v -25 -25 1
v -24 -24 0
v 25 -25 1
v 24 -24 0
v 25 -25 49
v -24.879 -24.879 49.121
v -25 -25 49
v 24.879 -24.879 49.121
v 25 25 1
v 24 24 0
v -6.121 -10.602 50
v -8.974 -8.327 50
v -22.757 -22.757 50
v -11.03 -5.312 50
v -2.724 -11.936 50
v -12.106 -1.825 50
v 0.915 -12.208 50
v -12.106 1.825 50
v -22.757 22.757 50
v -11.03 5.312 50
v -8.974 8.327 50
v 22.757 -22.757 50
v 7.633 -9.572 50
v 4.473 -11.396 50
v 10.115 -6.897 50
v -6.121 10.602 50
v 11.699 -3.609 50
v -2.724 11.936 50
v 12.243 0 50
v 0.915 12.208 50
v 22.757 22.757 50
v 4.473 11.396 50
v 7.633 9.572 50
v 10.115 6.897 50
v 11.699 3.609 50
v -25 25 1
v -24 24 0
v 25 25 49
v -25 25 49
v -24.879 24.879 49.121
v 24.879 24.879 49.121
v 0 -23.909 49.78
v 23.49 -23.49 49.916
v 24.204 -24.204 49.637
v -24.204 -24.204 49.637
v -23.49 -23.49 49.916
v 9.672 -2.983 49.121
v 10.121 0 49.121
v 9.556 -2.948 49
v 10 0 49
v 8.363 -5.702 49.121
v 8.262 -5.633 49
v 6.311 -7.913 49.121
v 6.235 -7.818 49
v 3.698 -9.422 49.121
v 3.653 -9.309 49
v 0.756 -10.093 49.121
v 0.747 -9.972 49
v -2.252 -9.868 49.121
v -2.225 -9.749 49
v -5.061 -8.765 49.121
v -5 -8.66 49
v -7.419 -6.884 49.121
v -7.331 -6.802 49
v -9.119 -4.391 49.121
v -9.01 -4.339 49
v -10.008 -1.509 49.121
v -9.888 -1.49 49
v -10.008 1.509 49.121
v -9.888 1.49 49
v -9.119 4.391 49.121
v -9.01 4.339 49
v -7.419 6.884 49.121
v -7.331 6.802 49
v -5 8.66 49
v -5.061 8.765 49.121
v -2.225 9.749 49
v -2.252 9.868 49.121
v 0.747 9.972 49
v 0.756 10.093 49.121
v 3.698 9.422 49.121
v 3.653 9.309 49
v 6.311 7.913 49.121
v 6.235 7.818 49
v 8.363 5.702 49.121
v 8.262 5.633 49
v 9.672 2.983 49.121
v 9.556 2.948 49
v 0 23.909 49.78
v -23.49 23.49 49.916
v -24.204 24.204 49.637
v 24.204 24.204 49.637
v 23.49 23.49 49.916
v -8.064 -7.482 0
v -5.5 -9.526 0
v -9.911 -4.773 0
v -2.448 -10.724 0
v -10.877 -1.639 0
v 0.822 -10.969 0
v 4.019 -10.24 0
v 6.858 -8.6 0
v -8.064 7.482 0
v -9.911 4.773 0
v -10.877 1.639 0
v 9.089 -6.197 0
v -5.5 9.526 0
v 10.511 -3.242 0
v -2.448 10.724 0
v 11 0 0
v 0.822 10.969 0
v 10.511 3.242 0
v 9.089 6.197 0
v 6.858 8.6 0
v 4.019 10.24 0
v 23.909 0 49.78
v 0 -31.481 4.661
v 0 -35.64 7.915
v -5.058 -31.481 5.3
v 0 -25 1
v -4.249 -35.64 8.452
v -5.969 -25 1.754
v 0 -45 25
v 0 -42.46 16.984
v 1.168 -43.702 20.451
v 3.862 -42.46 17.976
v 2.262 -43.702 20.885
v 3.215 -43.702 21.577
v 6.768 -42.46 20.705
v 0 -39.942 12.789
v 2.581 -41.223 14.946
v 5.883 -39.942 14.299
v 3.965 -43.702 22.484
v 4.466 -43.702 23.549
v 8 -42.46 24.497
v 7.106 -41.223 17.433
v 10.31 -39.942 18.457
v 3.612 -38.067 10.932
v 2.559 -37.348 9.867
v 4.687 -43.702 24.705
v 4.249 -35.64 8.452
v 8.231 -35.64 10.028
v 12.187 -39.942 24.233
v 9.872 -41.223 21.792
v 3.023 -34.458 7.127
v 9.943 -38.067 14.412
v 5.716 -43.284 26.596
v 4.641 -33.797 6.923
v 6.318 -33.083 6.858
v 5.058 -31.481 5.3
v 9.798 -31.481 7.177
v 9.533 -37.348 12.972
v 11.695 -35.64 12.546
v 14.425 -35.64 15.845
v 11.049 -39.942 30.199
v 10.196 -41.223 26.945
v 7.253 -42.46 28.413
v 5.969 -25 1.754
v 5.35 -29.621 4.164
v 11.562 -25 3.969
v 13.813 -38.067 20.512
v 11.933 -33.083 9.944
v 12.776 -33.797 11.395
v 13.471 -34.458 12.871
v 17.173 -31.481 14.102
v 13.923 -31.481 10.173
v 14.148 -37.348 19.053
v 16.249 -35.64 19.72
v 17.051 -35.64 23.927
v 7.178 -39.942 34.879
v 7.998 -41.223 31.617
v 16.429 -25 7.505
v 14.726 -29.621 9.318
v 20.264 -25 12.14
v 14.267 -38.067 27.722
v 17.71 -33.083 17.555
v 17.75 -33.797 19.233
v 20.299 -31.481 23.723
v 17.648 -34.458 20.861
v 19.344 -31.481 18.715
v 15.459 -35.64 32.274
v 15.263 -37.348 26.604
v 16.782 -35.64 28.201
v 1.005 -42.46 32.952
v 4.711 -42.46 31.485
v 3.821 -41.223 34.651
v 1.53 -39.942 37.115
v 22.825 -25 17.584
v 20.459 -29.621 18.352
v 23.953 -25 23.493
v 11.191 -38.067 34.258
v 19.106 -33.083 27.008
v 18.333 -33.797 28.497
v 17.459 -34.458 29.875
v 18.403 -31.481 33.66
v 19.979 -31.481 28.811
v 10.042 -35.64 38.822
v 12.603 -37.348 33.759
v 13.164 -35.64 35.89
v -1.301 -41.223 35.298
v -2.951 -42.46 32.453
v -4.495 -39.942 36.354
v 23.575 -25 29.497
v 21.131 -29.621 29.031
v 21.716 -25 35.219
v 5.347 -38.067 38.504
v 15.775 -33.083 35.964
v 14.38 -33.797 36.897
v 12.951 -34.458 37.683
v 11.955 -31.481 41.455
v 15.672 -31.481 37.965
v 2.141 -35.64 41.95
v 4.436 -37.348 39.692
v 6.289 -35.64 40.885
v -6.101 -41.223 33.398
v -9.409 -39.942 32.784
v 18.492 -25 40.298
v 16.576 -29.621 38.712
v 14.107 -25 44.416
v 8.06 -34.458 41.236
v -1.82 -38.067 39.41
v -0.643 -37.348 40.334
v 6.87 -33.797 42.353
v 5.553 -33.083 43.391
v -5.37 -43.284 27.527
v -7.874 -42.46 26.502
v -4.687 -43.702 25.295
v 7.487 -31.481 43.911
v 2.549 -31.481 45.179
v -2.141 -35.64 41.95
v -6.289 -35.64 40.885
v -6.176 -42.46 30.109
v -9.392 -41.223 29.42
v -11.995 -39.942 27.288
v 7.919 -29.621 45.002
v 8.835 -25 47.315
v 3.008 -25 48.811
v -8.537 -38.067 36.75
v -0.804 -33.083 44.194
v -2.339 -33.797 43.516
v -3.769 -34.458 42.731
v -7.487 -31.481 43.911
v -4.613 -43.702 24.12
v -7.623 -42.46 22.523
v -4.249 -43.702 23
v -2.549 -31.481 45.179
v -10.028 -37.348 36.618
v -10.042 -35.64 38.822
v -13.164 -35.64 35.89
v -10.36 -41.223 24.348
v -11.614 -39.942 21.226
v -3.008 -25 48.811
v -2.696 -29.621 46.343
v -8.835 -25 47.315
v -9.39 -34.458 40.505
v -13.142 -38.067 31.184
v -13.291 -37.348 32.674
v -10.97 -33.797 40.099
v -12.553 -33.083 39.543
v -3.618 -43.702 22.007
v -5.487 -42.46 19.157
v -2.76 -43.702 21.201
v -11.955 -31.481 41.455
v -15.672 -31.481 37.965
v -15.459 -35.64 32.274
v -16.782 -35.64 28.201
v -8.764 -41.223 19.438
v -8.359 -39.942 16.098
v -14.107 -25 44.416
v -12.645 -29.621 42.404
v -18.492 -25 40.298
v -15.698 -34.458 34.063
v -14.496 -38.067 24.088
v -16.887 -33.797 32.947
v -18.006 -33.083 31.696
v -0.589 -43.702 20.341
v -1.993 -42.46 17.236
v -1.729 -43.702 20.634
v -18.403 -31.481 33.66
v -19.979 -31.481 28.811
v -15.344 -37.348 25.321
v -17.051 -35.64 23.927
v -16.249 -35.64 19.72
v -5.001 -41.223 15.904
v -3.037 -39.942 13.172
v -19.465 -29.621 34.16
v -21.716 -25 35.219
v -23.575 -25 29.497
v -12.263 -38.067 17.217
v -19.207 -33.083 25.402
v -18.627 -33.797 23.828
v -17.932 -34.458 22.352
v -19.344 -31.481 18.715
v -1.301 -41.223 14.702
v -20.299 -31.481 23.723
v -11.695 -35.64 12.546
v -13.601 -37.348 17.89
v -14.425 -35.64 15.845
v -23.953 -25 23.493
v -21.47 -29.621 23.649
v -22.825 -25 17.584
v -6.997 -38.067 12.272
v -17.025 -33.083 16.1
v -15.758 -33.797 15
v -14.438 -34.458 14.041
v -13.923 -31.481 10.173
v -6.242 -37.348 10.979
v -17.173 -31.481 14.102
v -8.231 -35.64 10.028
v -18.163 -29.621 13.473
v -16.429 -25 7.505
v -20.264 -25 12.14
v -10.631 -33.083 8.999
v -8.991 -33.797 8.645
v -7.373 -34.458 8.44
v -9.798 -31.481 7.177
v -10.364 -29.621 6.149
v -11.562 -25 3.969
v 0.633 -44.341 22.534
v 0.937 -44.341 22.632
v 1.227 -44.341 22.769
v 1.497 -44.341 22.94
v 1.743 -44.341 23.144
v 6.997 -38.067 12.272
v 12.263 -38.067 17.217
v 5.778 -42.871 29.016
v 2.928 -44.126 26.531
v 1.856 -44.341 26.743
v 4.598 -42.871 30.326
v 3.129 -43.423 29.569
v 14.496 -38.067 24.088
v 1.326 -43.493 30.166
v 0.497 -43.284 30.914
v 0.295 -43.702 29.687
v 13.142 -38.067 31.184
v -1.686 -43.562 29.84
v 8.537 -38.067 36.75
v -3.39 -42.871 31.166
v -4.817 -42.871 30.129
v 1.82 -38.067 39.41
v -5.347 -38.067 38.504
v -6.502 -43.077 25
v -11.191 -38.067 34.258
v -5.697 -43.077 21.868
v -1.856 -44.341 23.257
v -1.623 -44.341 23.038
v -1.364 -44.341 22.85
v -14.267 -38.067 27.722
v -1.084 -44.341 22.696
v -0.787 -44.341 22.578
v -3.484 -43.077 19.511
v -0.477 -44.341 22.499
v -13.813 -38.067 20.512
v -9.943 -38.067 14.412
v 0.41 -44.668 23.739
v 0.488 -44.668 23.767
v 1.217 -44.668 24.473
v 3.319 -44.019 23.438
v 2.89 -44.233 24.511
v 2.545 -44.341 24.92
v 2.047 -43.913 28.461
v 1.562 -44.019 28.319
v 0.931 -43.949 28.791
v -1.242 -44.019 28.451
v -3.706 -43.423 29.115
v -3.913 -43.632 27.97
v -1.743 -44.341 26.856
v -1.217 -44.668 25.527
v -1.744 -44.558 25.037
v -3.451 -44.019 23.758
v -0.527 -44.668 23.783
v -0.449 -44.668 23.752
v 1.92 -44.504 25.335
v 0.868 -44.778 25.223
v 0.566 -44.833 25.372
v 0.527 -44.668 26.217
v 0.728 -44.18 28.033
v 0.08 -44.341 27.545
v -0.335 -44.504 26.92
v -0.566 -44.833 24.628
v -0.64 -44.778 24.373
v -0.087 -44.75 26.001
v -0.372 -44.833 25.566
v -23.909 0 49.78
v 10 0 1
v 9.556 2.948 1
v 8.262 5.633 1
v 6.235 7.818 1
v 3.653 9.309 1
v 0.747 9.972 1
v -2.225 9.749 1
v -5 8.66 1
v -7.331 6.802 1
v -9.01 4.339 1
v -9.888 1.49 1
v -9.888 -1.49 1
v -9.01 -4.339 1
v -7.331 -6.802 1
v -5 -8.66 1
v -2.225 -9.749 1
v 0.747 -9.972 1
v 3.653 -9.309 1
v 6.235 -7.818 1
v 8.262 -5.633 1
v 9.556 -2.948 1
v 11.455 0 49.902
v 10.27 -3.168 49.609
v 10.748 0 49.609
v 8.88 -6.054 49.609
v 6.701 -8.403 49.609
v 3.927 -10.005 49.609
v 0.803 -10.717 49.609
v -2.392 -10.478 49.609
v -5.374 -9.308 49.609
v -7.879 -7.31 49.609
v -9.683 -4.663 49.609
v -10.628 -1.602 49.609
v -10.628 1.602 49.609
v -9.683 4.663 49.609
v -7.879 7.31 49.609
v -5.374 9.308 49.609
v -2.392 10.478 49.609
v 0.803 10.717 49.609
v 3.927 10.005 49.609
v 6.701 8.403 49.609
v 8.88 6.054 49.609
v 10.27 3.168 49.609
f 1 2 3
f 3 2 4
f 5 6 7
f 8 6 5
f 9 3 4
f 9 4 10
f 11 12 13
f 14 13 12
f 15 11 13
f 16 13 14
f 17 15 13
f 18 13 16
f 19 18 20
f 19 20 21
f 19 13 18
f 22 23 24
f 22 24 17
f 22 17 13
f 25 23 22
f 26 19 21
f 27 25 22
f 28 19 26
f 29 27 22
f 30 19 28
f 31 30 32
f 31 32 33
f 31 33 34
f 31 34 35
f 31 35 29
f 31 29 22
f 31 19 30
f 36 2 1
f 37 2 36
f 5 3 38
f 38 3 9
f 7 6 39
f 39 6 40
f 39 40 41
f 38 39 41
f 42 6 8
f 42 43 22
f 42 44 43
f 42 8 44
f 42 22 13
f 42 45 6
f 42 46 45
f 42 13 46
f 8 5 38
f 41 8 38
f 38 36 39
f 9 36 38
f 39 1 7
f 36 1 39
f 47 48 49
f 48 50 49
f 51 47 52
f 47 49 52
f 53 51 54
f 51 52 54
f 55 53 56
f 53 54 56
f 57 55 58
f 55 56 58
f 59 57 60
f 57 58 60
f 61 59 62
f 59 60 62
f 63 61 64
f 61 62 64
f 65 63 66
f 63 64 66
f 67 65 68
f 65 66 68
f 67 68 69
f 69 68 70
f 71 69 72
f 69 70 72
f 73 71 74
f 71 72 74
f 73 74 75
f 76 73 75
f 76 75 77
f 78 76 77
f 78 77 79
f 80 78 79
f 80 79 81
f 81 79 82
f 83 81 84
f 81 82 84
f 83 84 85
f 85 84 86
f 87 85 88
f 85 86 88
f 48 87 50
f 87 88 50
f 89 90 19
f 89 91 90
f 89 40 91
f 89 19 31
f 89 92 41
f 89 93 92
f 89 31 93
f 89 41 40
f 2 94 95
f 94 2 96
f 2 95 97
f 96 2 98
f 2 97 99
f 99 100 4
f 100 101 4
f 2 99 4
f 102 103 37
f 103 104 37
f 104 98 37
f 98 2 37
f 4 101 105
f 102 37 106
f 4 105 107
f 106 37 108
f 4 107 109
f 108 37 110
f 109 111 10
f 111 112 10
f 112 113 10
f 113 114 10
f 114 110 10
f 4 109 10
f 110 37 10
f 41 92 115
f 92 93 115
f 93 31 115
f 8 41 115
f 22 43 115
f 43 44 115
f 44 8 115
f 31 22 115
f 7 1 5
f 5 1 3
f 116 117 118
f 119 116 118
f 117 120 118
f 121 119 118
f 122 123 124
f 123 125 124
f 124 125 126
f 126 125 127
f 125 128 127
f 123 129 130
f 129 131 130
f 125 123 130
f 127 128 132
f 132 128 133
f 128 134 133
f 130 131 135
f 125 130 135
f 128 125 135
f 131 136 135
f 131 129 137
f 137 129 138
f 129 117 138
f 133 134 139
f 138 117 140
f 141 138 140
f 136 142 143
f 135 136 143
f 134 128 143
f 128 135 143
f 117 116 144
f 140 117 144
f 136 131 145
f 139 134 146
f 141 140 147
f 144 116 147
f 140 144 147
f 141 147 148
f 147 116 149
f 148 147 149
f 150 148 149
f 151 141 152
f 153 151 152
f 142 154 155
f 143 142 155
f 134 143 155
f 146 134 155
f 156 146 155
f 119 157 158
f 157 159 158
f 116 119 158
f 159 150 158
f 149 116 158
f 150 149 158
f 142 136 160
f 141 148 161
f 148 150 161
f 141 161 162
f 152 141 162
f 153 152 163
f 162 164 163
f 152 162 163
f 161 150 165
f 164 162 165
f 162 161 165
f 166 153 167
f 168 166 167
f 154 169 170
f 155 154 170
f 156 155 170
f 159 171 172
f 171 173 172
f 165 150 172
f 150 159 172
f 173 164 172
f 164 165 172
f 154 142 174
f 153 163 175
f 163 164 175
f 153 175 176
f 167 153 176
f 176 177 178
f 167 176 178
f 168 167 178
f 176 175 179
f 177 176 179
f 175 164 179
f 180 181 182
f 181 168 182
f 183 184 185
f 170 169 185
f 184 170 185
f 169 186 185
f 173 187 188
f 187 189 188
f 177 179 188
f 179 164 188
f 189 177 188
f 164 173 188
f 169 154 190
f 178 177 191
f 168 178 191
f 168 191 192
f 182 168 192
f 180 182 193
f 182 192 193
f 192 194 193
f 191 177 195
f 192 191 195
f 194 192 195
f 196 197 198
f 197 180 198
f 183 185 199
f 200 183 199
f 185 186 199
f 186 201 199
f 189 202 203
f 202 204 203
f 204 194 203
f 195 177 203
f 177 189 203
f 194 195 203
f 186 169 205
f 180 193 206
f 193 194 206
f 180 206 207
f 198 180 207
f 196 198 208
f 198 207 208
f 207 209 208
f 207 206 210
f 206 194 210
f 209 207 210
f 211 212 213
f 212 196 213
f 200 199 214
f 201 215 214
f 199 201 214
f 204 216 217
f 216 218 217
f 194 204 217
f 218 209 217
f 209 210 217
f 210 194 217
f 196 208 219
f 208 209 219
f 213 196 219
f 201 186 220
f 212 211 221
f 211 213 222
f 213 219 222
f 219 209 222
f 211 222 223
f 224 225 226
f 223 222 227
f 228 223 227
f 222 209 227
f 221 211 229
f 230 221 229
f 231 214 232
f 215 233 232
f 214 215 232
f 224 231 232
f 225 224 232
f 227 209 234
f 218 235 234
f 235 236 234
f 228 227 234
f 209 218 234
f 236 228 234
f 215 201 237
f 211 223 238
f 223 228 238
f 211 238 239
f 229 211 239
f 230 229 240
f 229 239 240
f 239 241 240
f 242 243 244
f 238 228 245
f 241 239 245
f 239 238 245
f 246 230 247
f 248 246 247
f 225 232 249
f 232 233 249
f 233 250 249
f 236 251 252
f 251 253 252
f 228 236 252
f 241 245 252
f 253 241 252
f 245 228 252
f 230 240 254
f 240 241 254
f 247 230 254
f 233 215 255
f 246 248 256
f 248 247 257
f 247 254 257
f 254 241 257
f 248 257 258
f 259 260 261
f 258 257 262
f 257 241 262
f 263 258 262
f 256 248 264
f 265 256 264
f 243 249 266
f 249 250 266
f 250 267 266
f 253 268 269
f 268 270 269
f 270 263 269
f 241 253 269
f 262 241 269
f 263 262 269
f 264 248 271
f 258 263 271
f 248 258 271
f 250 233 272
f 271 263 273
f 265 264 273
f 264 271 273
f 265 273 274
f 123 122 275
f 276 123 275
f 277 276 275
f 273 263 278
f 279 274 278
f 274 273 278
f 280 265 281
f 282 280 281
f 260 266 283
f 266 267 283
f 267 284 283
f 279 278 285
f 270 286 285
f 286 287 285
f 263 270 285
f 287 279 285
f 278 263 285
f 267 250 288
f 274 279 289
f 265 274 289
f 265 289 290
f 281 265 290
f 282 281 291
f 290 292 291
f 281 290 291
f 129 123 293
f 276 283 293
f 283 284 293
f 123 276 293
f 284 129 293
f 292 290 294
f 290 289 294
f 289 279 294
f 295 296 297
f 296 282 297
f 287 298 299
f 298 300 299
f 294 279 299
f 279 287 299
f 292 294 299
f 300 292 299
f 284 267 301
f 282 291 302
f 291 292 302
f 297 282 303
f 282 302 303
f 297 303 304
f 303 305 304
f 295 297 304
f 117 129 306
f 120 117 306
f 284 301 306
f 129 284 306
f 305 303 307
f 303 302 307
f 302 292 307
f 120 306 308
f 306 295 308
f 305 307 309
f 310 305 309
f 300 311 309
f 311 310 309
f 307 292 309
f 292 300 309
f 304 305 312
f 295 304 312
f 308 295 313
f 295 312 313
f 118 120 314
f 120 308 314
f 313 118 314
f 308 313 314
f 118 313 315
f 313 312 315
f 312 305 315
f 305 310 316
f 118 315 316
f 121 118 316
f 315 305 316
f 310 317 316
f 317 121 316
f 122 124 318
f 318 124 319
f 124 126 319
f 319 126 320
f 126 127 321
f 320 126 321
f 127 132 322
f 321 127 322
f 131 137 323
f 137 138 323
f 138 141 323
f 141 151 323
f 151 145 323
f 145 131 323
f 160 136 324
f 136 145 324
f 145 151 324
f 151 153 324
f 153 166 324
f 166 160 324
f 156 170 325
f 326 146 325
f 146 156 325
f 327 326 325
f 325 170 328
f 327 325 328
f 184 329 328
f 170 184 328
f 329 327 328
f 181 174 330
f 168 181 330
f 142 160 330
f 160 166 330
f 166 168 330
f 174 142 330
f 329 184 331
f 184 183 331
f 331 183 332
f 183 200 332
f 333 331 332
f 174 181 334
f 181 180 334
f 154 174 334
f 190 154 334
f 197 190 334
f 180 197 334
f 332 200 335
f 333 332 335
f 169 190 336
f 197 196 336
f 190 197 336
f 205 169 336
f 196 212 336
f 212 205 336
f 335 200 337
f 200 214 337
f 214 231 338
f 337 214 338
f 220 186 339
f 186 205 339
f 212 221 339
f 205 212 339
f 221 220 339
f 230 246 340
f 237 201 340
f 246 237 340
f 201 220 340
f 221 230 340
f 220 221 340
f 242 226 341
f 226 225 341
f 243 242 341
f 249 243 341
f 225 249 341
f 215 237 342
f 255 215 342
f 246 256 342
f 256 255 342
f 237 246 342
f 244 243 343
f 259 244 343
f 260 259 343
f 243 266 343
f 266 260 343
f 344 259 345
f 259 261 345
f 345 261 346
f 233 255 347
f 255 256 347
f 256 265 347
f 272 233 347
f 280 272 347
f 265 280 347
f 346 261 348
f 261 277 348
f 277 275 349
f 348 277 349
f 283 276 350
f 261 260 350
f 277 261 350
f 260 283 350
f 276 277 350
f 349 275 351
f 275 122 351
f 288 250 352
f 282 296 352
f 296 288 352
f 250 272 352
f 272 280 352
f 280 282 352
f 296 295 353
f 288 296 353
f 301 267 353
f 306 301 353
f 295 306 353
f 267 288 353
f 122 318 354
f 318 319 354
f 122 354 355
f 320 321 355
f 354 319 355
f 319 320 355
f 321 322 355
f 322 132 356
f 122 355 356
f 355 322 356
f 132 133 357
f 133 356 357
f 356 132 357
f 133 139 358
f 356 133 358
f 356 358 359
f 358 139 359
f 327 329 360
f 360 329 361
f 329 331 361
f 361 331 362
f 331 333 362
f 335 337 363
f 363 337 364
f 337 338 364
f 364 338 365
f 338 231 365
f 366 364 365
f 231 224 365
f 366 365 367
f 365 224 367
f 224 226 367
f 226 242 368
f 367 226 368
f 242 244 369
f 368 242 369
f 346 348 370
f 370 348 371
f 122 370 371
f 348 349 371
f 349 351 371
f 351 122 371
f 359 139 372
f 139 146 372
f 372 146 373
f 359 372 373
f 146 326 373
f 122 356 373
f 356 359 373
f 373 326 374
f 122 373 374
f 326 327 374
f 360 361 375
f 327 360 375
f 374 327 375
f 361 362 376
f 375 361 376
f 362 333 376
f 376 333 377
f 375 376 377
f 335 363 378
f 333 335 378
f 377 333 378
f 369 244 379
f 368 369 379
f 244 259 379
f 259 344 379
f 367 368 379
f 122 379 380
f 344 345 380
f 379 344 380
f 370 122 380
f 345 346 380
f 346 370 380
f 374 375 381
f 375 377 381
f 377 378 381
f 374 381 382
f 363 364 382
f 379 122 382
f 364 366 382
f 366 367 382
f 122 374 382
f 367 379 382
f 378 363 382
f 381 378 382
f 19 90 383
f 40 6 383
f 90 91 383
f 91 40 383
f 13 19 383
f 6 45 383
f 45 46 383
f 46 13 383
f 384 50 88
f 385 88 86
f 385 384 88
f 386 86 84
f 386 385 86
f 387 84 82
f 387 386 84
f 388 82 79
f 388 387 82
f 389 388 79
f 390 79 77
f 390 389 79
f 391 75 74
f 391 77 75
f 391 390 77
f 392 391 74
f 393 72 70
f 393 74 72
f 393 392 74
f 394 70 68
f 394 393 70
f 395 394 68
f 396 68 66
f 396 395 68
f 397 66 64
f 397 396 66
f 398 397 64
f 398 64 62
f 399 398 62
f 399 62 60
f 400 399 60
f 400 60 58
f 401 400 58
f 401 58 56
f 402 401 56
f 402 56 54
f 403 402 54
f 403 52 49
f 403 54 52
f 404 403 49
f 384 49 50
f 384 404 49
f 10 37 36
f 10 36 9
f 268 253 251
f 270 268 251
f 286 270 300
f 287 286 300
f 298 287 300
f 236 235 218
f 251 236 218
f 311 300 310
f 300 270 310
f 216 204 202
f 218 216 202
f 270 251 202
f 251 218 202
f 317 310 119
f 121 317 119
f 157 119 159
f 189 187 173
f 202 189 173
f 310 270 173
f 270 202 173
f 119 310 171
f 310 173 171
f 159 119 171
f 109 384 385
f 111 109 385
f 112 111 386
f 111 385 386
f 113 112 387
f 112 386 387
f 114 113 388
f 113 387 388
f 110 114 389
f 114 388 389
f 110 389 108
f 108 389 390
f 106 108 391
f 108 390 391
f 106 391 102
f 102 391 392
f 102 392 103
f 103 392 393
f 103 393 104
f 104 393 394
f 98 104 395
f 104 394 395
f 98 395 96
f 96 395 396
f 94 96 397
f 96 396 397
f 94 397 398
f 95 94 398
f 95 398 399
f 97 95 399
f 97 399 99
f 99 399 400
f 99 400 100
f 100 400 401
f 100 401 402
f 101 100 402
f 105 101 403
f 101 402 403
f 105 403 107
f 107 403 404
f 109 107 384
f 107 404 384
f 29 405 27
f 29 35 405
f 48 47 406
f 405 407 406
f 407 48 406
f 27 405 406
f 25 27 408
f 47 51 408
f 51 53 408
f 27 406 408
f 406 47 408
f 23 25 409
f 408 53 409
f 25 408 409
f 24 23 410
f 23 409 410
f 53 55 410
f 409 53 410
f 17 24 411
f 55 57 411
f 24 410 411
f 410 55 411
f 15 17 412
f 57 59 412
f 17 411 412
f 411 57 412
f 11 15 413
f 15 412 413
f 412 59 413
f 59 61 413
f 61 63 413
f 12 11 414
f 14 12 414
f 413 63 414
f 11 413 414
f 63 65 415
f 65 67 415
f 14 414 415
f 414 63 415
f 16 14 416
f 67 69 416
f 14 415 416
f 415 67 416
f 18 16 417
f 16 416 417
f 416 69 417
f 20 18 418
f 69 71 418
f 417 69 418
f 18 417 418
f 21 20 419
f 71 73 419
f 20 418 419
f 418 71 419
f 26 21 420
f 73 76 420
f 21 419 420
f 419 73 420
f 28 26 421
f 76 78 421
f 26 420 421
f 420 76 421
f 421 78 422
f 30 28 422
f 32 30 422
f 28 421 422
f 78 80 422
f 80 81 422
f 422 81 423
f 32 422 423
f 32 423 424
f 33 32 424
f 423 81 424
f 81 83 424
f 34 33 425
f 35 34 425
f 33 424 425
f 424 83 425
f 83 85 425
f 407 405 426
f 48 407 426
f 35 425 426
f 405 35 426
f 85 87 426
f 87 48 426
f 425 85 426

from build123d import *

# Parameters (mm, degrees)
F0_W        = 50
F0_H        = 50
F1_DEPTH    = 50
F2_R        = 10
F1_FACE_W   = 50
F1_FACE_H   = 50
F3_DEPTH    = 50.001
F4_SIZE     = 1
F5_T1_DEPTH = 54.2132034356
F5_T3_DEPTH = 54.2132034356


# Not quite as in the source:
# - a fillet or chamfer that OpenCascade refuses, or shapes differently, is made with other operations: its cross-section is extruded or revolved along the edge and cut away or added


with BuildPart() as f1:
    # F0 (on Top) → F1 (new body)
    with BuildSketch(Plane.XY):
        Rectangle(F0_W, F0_H)
    extrude(amount=F1_DEPTH)

    # F2 (on Top) + F1_face (on face) → F3 (cut, through all)
    with BuildSketch(Plane.XY):
        Circle(F2_R)
    with BuildSketch(Plane.XY.offset(50)):
        Rectangle(F1_FACE_W, F1_FACE_H)
    extrude(amount=F3_DEPTH, mode=Mode.SUBTRACT)

    # F4
    f4_edges = [f1.edges().sort_by_distance(p)[0] for p in [
        (25, 0, 0),
        (0, -25, 0),
        (0, 25, 0),
        (-25, 0, 0),
        (-10, 0, 0),
        (25, 0, 50),
        (0, -25, 50),
        (0, 25, 50),
        (-25, 0, 50),
        (-10, 0, 50),
    ]]
    chamfer(f4_edges, length=F4_SIZE)

    # F5: fillet of radius 3 on 5 edges, made by hand

    # F5_s2 → F5_t1 (cut)
    with BuildSketch(Plane.XZ.offset(-27.1066017178)):
        with BuildLine():
            add(Edge.make_bspline(
                [(24.8786796564, 49.1213203436), (24, 50), (22.7573593129, 50)],
                knots=[0, 0, 0, 1, 1, 1], degree=2, weights=[1, 1, 1]))
            Line((22.7573593129, 50), (24, 50))
            Line((24, 50), (24.8786796564, 49.1213203436))
        make_face()
        with BuildLine():
            add(Edge.make_bspline(
                [(-22.7573593129, 50), (-24, 50), (-24.8786796564, 49.1213203436)],
                knots=[0, 0, 0, 1, 1, 1], degree=2, weights=[1, 1, 1]))
            Line((-24.8786796564, 49.1213203436), (-24, 50))
            Line((-24, 50), (-22.7573593129, 50))
        make_face()
    extrude(amount=F5_T1_DEPTH, mode=Mode.SUBTRACT)

    # F5_s4 → F5_t3 (cut)
    with BuildSketch(Plane.YZ.offset(-27.1066017178)):
        with BuildLine():
            add(Edge.make_bspline(
                [(-24.8786796564, 49.1213203436), (-24, 50), (-22.7573593129, 50)],
                knots=[0, 0, 0, 1, 1, 1], degree=2, weights=[1, 1, 1]))
            Line((-22.7573593129, 50), (-24, 50))
            Line((-24, 50), (-24.8786796564, 49.1213203436))
        make_face()
        with BuildLine():
            add(Edge.make_bspline(
                [(22.7573593129, 50), (24, 50), (24.8786796564, 49.1213203436)],
                knots=[0, 0, 0, 1, 1, 1], degree=2, weights=[1, 1, 1]))
            Line((24.8786796564, 49.1213203436), (24, 50))
            Line((24, 50), (22.7573593129, 50))
        make_face()
    extrude(amount=F5_T3_DEPTH, mode=Mode.SUBTRACT)

    # F5_s5 → F5_t6 (revolve, cut)
    with BuildSketch(Plane.XZ):
        with BuildLine():
            add(Edge.make_bspline(
                [(12.2426406871, 50), (11, 50), (10.1213203436, 49.1213203436)],
                knots=[0, 0, 0, 1, 1, 1], degree=2, weights=[1, 1, 1]))
            Line((10.1213203436, 49.1213203436), (11, 50))
            Line((11, 50), (12.2426406871, 50))
        make_face()
    revolve(axis=Axis((0, 0, 50), (0, 0, -1)), mode=Mode.SUBTRACT)


with BuildPart() as f7:
    # F6 (on Right) → F7 (revolve)
    with BuildSketch(Plane.YZ):
        with BuildLine():
            Line((-25, 1), (-25, 25))
            Line((-25, 25), (-45, 25))
            add(Edge.make_bspline(
                [(-45, 25), (-42.9437309504, 16.5351219475), (-39.3878491982, 12.0366081686), (-33.9029468596, 5.3530973382), (-25, 1)],
                knots=[0, 0, 0, 0, 0.4742530664, 1, 1, 1, 1], degree=3))
        make_face()
    revolve(axis=Axis((0, -35, 25), (0, -1, 0)))


solid = Compound([f1.part, f7.part])
